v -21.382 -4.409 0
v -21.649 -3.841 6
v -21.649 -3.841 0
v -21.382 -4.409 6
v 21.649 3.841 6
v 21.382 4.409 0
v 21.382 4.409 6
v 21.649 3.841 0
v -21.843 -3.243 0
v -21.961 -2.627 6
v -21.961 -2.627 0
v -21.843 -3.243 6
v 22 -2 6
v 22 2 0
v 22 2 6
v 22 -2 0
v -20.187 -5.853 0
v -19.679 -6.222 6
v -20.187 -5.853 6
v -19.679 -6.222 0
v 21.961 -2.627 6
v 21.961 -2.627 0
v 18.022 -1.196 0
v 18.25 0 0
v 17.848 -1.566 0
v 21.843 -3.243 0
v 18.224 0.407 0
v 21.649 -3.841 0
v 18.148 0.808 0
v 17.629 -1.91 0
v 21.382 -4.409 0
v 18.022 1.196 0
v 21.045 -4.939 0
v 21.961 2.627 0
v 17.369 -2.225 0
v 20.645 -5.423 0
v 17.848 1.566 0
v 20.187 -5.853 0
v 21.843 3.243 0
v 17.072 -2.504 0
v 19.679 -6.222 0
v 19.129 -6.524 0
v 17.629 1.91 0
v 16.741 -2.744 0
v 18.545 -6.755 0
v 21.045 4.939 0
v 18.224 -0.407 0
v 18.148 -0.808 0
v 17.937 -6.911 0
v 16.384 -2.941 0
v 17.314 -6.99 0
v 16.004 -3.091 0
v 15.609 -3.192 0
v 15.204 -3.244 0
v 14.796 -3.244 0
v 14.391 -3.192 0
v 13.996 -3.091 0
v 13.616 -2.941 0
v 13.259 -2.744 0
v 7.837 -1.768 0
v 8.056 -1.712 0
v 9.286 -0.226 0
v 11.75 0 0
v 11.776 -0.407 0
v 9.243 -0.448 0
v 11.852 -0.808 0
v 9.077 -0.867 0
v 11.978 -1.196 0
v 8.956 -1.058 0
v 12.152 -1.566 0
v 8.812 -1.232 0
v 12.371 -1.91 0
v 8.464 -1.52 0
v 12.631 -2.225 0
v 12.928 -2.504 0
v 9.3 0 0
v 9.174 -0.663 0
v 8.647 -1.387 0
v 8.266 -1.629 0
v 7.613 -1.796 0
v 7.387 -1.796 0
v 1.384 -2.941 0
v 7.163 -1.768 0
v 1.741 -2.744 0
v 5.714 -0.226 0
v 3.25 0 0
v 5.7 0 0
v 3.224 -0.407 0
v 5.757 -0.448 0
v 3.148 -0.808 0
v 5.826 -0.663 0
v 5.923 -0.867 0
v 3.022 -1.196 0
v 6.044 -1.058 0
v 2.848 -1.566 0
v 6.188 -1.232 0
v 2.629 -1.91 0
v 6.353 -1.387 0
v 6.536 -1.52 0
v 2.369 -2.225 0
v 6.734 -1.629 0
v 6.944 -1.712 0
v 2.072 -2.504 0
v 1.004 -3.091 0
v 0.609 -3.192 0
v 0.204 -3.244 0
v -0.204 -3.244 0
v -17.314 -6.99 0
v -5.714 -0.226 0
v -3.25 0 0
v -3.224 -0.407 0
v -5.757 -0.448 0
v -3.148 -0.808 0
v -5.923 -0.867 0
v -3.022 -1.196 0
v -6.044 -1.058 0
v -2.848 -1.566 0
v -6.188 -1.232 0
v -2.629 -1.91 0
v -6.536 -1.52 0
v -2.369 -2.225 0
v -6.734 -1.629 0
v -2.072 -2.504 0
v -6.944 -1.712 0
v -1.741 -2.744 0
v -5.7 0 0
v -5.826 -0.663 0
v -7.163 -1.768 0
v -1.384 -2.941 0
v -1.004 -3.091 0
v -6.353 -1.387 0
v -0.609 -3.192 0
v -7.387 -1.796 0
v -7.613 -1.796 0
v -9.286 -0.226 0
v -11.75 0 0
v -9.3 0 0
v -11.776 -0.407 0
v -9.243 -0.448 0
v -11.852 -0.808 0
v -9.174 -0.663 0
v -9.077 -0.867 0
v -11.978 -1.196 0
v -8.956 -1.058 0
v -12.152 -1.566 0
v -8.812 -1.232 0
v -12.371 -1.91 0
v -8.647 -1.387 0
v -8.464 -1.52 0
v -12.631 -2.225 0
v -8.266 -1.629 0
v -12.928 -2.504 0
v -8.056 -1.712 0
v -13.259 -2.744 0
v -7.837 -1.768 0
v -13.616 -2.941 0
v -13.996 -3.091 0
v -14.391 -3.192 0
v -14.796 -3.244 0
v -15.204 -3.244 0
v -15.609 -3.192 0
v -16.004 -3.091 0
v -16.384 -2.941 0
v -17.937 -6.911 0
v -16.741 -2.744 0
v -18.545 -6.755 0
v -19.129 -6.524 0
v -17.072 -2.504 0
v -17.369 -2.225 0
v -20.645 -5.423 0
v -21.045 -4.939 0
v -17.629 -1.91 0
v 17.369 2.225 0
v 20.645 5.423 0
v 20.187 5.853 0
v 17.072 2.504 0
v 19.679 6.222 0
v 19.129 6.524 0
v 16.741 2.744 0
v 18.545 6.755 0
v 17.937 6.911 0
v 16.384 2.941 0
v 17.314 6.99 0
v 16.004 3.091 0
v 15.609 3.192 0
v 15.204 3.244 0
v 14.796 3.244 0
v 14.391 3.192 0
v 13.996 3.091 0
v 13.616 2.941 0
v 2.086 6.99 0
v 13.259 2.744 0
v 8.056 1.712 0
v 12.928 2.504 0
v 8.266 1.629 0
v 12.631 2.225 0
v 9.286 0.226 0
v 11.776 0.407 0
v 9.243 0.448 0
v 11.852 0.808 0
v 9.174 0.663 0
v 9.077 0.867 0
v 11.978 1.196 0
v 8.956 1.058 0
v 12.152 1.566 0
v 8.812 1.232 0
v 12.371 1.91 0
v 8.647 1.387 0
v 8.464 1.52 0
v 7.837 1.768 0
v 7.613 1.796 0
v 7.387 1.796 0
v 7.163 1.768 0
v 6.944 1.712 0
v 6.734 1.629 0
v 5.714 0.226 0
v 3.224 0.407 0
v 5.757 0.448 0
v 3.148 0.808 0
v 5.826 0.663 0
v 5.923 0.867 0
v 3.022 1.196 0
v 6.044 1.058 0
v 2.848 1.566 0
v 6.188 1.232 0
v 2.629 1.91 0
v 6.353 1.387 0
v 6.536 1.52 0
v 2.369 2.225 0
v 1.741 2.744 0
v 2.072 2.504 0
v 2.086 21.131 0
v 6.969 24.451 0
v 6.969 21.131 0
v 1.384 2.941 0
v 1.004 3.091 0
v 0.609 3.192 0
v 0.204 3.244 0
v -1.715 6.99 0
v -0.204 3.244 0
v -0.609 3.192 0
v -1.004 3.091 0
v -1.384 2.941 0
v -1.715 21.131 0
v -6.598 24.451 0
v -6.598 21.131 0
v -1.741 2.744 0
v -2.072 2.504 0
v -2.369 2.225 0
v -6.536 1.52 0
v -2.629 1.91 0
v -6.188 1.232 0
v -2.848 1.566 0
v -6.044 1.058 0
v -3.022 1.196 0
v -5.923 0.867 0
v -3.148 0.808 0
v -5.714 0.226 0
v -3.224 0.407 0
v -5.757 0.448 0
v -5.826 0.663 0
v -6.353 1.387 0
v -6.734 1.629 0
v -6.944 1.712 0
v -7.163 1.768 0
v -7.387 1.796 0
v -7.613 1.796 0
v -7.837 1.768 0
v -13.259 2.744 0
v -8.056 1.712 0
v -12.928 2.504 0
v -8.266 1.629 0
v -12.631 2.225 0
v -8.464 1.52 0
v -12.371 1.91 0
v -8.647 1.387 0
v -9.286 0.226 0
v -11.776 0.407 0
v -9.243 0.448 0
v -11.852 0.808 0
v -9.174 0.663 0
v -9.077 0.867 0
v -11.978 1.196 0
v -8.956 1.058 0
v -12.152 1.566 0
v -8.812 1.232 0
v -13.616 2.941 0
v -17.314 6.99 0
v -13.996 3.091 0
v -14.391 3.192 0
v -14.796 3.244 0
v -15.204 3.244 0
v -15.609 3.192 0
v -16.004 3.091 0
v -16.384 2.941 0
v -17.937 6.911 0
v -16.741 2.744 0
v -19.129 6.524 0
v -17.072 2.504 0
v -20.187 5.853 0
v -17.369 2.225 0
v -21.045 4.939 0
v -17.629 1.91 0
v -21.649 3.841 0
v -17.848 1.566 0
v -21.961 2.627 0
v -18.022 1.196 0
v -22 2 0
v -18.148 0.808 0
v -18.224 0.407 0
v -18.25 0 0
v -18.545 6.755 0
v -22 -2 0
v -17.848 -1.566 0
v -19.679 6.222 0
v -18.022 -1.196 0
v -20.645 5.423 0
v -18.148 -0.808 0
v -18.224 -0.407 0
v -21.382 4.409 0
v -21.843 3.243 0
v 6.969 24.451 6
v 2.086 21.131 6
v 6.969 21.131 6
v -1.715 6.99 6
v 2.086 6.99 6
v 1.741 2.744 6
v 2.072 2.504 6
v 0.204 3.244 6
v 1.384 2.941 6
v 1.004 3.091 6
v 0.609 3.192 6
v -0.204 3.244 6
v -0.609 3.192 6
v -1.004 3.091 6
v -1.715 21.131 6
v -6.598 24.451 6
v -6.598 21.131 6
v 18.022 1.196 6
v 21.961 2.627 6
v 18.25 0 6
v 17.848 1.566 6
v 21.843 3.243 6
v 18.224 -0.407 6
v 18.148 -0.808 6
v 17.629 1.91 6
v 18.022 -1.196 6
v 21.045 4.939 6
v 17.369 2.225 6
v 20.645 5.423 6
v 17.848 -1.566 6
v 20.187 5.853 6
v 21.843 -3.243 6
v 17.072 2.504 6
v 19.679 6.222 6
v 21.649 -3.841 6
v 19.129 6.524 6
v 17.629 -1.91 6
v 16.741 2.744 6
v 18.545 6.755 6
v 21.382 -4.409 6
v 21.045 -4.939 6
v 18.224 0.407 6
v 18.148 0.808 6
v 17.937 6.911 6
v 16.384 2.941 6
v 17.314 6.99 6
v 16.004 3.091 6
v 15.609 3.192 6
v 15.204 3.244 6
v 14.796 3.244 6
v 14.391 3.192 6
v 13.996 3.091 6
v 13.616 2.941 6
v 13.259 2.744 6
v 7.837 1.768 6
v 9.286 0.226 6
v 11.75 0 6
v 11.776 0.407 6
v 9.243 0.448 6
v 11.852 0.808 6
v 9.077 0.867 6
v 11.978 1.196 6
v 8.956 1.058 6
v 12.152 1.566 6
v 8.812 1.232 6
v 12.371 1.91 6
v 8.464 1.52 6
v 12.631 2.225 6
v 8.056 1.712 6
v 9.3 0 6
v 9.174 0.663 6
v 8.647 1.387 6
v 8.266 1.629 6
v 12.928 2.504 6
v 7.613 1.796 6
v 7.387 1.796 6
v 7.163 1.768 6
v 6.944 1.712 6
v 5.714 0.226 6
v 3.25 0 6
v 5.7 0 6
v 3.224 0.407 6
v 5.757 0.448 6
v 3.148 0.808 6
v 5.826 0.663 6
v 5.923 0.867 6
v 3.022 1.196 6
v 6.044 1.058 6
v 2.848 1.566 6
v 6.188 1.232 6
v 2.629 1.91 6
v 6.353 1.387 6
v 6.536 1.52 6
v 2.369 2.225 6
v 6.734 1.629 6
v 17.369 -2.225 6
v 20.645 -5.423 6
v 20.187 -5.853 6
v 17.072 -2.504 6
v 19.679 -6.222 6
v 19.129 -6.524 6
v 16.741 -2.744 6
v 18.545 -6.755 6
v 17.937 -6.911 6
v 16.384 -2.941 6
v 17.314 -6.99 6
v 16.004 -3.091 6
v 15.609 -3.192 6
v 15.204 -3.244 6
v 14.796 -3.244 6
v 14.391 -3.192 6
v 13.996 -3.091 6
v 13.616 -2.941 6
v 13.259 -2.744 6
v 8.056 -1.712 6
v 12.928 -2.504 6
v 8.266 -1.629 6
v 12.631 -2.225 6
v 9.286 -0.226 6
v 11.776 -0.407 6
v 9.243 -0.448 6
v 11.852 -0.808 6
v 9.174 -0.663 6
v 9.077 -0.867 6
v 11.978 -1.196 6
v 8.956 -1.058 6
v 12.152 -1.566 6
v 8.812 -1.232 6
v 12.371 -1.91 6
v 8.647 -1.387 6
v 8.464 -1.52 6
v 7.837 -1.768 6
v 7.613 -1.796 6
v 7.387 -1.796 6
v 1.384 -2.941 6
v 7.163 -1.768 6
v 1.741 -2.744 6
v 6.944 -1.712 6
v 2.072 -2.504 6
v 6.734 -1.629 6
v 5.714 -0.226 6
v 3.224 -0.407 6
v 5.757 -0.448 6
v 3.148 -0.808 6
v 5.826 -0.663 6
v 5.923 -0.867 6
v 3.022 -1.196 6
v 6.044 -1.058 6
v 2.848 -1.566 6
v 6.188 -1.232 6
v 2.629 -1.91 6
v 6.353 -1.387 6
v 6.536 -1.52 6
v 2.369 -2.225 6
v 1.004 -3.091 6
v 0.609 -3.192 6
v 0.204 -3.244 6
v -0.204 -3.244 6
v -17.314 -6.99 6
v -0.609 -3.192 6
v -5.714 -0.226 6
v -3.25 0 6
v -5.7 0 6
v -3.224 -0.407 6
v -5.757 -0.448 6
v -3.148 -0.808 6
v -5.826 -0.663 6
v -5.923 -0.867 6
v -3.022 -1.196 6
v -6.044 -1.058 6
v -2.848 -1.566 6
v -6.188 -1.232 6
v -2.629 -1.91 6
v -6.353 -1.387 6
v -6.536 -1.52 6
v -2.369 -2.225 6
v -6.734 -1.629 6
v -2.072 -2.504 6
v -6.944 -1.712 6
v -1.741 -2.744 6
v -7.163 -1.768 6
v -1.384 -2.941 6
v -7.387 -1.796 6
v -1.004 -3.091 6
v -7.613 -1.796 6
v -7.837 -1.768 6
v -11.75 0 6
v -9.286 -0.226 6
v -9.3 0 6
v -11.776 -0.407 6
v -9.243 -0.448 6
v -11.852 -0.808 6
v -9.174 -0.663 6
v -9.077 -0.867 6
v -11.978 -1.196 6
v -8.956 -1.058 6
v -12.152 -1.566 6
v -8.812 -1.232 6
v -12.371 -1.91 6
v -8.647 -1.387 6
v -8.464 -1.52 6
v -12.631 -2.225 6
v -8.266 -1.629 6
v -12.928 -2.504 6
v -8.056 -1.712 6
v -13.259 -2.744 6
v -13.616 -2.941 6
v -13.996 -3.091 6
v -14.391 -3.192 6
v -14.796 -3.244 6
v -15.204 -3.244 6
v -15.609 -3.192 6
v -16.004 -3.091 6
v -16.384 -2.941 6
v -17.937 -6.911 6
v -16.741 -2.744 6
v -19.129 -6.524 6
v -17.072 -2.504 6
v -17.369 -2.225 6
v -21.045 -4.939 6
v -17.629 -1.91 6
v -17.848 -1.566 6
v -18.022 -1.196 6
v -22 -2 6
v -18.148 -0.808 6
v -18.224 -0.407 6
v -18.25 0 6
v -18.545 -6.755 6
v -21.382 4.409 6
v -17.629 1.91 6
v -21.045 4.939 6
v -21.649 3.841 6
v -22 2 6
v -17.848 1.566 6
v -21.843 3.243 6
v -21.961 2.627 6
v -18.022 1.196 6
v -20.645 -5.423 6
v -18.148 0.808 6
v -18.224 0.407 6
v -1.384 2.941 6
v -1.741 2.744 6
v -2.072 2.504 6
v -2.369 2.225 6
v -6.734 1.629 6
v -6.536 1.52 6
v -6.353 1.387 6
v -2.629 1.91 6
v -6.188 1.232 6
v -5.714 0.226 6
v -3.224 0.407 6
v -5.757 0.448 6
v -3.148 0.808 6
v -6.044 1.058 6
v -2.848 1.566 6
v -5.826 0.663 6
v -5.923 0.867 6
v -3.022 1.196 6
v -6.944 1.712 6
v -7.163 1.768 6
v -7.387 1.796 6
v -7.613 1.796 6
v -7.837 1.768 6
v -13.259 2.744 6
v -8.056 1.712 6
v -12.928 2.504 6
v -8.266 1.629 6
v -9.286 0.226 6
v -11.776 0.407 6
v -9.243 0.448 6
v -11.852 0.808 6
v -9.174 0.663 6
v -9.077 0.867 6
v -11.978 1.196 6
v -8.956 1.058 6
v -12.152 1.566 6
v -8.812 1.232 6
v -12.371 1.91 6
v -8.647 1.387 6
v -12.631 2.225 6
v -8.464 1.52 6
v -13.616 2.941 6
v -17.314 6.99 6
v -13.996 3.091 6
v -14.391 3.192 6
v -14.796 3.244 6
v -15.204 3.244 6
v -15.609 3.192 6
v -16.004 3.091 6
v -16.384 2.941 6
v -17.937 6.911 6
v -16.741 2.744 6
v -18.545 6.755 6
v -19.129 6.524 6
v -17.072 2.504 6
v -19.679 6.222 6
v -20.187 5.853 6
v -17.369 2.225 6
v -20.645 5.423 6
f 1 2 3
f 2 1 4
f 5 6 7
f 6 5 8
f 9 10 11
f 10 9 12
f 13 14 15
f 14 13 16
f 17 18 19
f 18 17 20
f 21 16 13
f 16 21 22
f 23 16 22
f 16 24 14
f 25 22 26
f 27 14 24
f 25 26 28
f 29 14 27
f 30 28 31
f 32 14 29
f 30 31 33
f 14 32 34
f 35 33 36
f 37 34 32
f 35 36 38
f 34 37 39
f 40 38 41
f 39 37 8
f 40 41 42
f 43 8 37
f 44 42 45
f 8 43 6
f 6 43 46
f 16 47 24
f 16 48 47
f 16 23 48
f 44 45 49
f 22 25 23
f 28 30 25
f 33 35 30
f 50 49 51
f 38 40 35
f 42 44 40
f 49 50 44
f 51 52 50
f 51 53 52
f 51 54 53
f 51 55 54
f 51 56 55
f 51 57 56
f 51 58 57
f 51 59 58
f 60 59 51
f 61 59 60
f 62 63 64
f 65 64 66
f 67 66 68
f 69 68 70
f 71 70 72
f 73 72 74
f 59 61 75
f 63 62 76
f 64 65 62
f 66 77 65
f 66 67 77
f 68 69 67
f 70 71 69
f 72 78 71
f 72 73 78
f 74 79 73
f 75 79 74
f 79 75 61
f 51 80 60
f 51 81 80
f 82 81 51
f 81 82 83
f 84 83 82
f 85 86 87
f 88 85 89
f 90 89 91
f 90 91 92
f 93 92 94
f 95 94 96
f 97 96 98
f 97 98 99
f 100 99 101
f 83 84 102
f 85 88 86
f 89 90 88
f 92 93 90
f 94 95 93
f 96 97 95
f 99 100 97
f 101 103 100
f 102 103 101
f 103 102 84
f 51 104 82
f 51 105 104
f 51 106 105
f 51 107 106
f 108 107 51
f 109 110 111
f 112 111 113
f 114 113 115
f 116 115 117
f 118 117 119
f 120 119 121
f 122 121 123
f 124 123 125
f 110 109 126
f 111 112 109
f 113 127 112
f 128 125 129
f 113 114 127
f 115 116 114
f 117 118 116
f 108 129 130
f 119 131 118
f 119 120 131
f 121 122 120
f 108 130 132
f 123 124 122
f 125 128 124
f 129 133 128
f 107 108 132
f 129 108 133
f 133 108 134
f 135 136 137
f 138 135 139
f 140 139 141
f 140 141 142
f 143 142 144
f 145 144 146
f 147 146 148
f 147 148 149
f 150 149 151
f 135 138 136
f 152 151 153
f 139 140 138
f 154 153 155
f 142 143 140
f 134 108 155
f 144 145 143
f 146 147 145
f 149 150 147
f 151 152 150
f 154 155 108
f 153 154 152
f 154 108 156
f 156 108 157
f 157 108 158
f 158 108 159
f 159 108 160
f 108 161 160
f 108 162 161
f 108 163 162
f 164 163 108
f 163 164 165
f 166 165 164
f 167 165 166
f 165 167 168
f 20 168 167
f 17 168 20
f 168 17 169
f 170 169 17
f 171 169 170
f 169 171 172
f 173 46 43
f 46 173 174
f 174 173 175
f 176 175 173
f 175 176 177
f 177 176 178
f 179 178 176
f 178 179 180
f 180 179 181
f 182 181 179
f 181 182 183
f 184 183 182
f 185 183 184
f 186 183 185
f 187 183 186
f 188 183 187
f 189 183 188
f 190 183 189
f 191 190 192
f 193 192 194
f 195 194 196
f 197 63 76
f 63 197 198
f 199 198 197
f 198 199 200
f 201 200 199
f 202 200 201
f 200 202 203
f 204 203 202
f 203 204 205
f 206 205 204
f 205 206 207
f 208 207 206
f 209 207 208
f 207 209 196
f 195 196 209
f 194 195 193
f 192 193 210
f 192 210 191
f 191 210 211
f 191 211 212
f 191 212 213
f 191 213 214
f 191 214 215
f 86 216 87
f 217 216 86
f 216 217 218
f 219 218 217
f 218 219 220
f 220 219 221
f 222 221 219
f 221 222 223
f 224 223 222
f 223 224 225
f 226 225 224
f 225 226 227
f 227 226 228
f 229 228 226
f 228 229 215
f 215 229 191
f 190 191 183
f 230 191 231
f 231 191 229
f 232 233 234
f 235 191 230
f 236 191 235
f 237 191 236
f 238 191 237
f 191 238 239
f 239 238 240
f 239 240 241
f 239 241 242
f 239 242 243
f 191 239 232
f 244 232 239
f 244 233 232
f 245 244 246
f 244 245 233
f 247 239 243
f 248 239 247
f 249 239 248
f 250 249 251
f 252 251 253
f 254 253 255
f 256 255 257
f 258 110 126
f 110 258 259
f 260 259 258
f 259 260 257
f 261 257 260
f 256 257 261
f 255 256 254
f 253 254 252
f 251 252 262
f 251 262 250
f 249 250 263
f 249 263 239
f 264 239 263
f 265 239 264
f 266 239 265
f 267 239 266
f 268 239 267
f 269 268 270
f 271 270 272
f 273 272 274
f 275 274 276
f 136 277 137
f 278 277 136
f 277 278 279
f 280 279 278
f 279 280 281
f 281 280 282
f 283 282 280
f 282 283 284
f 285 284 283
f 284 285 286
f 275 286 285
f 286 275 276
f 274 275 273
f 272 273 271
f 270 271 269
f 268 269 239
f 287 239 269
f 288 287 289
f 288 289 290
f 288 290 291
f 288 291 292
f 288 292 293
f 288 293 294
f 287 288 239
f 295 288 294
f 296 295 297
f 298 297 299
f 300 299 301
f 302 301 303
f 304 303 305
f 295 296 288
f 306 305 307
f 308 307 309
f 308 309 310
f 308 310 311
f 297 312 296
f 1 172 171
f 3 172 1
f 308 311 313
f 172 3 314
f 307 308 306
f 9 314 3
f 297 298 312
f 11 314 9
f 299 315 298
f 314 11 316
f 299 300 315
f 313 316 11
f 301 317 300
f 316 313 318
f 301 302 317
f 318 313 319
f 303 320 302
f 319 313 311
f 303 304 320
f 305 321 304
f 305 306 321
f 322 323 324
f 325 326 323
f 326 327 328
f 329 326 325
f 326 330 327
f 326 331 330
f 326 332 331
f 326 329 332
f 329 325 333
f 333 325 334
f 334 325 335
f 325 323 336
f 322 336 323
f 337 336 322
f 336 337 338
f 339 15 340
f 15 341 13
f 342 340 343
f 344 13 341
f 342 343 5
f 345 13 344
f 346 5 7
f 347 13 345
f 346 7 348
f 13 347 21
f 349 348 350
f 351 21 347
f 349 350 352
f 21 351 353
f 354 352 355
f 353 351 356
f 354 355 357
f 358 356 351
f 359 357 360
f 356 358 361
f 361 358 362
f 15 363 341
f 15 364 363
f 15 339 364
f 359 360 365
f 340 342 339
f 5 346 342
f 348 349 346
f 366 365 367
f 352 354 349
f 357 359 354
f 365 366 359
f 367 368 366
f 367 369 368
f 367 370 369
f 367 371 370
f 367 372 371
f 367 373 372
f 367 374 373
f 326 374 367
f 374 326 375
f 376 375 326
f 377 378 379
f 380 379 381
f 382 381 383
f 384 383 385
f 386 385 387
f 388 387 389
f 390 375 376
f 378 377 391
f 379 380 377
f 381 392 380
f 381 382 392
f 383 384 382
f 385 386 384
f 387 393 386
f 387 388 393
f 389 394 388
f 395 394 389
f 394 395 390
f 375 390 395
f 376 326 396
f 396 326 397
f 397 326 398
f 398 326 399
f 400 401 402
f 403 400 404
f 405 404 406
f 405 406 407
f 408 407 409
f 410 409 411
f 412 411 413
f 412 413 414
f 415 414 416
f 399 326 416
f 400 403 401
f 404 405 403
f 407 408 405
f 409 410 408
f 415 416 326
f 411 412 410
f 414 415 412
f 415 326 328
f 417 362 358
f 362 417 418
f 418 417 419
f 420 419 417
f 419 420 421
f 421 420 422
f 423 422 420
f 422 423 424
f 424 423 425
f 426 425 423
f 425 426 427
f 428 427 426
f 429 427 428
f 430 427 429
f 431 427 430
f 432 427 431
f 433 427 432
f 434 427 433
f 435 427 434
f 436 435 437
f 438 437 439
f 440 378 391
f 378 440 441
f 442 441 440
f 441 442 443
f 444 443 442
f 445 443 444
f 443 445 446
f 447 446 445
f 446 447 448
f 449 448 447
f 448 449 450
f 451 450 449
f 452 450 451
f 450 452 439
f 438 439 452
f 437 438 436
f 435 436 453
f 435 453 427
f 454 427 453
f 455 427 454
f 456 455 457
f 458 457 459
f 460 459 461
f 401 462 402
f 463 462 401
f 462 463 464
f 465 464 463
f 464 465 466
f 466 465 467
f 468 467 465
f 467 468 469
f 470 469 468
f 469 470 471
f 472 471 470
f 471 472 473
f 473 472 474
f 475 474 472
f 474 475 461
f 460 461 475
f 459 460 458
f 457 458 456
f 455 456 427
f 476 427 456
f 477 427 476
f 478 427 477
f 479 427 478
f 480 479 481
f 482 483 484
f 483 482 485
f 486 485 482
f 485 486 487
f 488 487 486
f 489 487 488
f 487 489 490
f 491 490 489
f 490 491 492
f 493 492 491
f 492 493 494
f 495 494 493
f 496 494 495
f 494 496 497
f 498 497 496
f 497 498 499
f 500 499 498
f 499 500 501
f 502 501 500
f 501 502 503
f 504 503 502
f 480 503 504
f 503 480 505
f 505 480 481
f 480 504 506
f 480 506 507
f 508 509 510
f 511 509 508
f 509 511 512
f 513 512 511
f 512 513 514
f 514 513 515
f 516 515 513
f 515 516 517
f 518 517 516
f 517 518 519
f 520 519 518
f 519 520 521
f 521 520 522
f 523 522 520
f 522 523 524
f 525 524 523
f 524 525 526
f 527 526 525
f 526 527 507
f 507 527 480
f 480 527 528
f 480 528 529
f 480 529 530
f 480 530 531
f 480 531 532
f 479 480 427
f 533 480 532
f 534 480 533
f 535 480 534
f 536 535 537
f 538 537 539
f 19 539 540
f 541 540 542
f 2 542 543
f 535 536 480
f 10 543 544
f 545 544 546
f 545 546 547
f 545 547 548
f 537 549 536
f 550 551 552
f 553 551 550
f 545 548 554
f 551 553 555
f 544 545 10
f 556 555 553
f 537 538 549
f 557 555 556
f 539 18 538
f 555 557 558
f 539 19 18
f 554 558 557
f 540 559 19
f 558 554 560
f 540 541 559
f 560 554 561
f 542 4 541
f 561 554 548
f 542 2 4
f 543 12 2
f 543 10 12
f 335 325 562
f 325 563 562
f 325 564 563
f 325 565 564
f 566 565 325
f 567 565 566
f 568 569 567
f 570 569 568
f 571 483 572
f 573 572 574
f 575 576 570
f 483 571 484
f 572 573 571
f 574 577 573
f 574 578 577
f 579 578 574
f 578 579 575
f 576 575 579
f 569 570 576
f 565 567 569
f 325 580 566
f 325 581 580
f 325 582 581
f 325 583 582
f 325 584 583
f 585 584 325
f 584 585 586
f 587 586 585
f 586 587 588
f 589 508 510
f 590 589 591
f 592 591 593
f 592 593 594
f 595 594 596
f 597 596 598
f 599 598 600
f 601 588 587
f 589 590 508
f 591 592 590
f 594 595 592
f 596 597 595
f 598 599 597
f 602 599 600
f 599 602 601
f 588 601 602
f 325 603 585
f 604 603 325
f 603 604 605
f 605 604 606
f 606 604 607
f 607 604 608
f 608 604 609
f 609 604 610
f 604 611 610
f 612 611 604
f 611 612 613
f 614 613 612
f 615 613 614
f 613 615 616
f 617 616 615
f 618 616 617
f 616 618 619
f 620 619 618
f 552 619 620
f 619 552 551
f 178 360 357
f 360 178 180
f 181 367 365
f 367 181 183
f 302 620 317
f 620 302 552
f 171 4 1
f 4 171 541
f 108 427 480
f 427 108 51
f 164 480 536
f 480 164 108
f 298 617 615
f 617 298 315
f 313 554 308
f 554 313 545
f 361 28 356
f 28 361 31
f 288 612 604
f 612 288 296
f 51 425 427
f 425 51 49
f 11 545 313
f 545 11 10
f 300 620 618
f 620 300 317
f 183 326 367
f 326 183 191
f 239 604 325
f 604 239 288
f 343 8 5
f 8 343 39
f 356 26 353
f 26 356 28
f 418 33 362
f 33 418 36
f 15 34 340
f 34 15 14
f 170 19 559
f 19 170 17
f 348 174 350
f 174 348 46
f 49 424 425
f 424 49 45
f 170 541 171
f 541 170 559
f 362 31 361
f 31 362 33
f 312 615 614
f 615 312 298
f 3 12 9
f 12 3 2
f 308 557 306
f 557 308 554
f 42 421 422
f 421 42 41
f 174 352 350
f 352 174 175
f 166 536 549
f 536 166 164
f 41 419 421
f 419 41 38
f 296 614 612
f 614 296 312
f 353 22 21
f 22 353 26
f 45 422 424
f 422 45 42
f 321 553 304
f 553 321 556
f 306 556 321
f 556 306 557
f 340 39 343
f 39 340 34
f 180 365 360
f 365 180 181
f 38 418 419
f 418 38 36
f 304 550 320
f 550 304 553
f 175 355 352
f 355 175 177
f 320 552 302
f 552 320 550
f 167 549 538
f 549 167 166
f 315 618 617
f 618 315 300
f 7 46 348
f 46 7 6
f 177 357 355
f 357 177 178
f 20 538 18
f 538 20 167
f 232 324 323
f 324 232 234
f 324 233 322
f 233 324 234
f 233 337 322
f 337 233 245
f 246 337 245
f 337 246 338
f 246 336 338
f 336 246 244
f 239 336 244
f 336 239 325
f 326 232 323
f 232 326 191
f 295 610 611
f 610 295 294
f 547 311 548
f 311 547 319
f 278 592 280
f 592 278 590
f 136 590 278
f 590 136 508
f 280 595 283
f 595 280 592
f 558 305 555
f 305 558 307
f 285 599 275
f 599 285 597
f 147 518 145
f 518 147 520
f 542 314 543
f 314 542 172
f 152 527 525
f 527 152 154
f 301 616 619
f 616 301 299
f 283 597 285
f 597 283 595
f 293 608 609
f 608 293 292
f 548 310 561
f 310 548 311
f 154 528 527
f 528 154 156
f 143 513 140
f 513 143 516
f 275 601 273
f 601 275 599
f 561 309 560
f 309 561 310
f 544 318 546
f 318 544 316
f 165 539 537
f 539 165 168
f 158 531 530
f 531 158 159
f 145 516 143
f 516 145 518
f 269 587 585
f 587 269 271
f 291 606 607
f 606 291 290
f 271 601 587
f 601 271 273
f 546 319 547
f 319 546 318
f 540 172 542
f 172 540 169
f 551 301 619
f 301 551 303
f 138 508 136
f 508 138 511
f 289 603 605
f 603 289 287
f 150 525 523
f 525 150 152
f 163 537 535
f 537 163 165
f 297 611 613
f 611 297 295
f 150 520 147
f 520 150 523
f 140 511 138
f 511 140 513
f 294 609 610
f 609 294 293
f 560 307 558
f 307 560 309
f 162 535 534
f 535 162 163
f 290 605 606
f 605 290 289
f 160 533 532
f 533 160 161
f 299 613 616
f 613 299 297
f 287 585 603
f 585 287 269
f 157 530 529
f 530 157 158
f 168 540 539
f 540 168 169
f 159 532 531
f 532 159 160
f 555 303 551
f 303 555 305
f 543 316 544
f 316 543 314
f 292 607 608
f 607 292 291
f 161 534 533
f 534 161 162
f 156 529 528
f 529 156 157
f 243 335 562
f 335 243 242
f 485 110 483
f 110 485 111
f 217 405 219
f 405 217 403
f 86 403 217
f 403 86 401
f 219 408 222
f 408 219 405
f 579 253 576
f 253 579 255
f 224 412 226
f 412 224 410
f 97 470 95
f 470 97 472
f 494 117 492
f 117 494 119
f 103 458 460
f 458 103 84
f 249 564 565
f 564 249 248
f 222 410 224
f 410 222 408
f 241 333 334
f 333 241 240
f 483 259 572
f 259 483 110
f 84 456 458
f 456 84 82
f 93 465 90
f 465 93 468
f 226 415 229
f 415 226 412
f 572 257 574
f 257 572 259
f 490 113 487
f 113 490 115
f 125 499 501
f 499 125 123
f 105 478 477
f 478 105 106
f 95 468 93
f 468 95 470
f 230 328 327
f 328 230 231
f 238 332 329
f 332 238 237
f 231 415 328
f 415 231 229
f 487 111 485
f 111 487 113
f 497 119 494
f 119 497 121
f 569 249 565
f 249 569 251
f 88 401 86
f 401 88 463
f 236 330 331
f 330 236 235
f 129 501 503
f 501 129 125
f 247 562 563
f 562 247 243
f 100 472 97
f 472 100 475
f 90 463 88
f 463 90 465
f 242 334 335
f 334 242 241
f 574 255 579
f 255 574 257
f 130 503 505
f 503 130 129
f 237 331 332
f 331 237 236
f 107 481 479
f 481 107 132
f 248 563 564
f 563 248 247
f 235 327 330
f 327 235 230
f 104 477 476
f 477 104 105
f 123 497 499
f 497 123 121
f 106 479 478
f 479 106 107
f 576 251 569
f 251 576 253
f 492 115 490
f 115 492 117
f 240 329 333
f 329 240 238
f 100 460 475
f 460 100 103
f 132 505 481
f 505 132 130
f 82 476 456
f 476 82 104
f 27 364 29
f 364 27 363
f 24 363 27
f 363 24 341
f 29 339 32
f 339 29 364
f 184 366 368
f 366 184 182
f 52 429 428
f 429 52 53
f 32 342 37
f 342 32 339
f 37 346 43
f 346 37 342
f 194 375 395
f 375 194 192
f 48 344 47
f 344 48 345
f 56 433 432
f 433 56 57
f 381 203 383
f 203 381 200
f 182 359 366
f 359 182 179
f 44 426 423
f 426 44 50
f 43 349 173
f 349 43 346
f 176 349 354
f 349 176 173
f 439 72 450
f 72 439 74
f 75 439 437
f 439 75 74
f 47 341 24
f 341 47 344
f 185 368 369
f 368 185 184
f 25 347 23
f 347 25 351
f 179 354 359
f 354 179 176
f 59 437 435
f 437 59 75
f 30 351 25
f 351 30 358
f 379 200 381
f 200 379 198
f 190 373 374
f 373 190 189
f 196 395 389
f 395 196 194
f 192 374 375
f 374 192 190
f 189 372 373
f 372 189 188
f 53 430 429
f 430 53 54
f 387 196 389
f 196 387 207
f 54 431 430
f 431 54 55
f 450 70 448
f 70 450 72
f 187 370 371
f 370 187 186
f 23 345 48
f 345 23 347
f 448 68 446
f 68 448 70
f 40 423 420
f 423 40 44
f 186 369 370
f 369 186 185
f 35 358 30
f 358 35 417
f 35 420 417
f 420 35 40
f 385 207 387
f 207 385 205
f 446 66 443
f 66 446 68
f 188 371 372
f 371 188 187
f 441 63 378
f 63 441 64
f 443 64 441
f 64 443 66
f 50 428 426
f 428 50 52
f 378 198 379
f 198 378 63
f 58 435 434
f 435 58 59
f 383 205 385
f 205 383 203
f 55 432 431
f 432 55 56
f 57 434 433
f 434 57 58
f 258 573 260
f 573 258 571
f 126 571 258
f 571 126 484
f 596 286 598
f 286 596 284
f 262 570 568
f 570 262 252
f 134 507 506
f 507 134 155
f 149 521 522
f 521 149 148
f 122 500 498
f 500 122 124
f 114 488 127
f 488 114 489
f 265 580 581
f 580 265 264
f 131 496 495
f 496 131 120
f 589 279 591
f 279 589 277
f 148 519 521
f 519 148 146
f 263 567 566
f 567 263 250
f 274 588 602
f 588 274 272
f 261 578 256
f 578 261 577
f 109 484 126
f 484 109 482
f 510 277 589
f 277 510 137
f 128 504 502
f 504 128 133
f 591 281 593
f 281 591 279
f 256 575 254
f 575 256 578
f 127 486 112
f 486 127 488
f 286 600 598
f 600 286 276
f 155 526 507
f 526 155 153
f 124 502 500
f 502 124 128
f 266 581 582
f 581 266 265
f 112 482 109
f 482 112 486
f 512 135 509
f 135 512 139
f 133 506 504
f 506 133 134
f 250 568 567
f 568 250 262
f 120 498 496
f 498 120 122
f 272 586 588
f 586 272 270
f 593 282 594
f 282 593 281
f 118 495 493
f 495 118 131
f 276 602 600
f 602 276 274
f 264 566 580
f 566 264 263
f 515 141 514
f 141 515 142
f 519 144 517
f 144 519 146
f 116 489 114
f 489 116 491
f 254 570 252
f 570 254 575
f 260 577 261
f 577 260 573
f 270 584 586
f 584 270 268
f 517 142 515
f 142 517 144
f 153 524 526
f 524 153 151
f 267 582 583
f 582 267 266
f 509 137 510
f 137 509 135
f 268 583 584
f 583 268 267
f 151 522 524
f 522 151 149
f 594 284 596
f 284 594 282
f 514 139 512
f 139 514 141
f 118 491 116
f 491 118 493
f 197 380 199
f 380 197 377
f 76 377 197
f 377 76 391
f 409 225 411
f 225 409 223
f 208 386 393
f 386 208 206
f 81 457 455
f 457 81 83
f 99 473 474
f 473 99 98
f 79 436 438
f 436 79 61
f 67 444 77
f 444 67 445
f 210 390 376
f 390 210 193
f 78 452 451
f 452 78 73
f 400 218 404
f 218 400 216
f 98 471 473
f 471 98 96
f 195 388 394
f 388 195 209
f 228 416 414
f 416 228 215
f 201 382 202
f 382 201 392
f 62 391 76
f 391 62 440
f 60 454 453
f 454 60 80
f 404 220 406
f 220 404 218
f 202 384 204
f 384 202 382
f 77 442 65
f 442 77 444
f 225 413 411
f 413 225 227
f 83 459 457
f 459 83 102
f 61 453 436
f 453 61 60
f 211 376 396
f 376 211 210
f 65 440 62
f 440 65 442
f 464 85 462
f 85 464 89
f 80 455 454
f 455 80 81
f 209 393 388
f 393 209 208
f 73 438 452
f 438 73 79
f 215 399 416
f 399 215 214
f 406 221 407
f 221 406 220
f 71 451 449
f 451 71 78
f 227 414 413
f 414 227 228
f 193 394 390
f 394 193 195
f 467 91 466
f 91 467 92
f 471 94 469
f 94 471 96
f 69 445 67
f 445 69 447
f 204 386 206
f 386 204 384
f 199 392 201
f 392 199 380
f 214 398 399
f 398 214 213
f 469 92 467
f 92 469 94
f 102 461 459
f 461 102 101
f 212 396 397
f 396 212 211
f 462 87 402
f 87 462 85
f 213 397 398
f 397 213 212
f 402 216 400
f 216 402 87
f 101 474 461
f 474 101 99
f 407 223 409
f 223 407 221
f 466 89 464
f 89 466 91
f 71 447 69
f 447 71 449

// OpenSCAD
$fn = 50;


difference() {
	union() {
		hull() {
			translate(v = [-17.0000000000, 2.0000000000, 0]) {
				cylinder(h = 6, r = 5);
			}
			translate(v = [17.0000000000, 2.0000000000, 0]) {
				cylinder(h = 6, r = 5);
			}
			translate(v = [-17.0000000000, -2.0000000000, 0]) {
				cylinder(h = 6, r = 5);
			}
			translate(v = [17.0000000000, -2.0000000000, 0]) {
				cylinder(h = 6, r = 5);
			}
		}
		translate(v = [0, 24, 0]) {
			linear_extrude(height = 6) {
				text(font = "DejaVu Sans Mono:style=Bold", halign = "center", size = 19.0000000000, text = "T", valign = "top");
			}
		}
	}
	union() {
		translate(v = [-15.0000000000, 0.0000000000, 0]) {
			translate(v = [0, 0, -100]) {
				cylinder(h = 200, r = 3.2500000000);
			}
		}
		translate(v = [0, 0, -100]) {
			cylinder(h = 200, r = 3.2500000000);
		}
		translate(v = [15.0000000000, 0.0000000000, 0]) {
			translate(v = [0, 0, -100]) {
				cylinder(h = 200, r = 3.2500000000);
			}
		}
		translate(v = [-15.0000000000, 0.0000000000, 0]) {
			translate(v = [0, 0, -100]) {
				cylinder(h = 200, r = 1.8000000000);
			}
		}
		translate(v = [-7.5000000000, 0.0000000000, 0]) {
			translate(v = [0, 0, -100]) {
				cylinder(h = 200, r = 1.8000000000);
			}
		}
		translate(v = [0, 0, -100]) {
			cylinder(h = 200, r = 1.8000000000);
		}
		translate(v = [7.5000000000, 0.0000000000, 0]) {
			translate(v = [0, 0, -100]) {
				cylinder(h = 200, r = 1.8000000000);
			}
		}
		translate(v = [15.0000000000, 0.0000000000, 0]) {
			translate(v = [0, 0, -100]) {
				cylinder(h = 200, r = 1.8000000000);
			}
		}
	}
}
